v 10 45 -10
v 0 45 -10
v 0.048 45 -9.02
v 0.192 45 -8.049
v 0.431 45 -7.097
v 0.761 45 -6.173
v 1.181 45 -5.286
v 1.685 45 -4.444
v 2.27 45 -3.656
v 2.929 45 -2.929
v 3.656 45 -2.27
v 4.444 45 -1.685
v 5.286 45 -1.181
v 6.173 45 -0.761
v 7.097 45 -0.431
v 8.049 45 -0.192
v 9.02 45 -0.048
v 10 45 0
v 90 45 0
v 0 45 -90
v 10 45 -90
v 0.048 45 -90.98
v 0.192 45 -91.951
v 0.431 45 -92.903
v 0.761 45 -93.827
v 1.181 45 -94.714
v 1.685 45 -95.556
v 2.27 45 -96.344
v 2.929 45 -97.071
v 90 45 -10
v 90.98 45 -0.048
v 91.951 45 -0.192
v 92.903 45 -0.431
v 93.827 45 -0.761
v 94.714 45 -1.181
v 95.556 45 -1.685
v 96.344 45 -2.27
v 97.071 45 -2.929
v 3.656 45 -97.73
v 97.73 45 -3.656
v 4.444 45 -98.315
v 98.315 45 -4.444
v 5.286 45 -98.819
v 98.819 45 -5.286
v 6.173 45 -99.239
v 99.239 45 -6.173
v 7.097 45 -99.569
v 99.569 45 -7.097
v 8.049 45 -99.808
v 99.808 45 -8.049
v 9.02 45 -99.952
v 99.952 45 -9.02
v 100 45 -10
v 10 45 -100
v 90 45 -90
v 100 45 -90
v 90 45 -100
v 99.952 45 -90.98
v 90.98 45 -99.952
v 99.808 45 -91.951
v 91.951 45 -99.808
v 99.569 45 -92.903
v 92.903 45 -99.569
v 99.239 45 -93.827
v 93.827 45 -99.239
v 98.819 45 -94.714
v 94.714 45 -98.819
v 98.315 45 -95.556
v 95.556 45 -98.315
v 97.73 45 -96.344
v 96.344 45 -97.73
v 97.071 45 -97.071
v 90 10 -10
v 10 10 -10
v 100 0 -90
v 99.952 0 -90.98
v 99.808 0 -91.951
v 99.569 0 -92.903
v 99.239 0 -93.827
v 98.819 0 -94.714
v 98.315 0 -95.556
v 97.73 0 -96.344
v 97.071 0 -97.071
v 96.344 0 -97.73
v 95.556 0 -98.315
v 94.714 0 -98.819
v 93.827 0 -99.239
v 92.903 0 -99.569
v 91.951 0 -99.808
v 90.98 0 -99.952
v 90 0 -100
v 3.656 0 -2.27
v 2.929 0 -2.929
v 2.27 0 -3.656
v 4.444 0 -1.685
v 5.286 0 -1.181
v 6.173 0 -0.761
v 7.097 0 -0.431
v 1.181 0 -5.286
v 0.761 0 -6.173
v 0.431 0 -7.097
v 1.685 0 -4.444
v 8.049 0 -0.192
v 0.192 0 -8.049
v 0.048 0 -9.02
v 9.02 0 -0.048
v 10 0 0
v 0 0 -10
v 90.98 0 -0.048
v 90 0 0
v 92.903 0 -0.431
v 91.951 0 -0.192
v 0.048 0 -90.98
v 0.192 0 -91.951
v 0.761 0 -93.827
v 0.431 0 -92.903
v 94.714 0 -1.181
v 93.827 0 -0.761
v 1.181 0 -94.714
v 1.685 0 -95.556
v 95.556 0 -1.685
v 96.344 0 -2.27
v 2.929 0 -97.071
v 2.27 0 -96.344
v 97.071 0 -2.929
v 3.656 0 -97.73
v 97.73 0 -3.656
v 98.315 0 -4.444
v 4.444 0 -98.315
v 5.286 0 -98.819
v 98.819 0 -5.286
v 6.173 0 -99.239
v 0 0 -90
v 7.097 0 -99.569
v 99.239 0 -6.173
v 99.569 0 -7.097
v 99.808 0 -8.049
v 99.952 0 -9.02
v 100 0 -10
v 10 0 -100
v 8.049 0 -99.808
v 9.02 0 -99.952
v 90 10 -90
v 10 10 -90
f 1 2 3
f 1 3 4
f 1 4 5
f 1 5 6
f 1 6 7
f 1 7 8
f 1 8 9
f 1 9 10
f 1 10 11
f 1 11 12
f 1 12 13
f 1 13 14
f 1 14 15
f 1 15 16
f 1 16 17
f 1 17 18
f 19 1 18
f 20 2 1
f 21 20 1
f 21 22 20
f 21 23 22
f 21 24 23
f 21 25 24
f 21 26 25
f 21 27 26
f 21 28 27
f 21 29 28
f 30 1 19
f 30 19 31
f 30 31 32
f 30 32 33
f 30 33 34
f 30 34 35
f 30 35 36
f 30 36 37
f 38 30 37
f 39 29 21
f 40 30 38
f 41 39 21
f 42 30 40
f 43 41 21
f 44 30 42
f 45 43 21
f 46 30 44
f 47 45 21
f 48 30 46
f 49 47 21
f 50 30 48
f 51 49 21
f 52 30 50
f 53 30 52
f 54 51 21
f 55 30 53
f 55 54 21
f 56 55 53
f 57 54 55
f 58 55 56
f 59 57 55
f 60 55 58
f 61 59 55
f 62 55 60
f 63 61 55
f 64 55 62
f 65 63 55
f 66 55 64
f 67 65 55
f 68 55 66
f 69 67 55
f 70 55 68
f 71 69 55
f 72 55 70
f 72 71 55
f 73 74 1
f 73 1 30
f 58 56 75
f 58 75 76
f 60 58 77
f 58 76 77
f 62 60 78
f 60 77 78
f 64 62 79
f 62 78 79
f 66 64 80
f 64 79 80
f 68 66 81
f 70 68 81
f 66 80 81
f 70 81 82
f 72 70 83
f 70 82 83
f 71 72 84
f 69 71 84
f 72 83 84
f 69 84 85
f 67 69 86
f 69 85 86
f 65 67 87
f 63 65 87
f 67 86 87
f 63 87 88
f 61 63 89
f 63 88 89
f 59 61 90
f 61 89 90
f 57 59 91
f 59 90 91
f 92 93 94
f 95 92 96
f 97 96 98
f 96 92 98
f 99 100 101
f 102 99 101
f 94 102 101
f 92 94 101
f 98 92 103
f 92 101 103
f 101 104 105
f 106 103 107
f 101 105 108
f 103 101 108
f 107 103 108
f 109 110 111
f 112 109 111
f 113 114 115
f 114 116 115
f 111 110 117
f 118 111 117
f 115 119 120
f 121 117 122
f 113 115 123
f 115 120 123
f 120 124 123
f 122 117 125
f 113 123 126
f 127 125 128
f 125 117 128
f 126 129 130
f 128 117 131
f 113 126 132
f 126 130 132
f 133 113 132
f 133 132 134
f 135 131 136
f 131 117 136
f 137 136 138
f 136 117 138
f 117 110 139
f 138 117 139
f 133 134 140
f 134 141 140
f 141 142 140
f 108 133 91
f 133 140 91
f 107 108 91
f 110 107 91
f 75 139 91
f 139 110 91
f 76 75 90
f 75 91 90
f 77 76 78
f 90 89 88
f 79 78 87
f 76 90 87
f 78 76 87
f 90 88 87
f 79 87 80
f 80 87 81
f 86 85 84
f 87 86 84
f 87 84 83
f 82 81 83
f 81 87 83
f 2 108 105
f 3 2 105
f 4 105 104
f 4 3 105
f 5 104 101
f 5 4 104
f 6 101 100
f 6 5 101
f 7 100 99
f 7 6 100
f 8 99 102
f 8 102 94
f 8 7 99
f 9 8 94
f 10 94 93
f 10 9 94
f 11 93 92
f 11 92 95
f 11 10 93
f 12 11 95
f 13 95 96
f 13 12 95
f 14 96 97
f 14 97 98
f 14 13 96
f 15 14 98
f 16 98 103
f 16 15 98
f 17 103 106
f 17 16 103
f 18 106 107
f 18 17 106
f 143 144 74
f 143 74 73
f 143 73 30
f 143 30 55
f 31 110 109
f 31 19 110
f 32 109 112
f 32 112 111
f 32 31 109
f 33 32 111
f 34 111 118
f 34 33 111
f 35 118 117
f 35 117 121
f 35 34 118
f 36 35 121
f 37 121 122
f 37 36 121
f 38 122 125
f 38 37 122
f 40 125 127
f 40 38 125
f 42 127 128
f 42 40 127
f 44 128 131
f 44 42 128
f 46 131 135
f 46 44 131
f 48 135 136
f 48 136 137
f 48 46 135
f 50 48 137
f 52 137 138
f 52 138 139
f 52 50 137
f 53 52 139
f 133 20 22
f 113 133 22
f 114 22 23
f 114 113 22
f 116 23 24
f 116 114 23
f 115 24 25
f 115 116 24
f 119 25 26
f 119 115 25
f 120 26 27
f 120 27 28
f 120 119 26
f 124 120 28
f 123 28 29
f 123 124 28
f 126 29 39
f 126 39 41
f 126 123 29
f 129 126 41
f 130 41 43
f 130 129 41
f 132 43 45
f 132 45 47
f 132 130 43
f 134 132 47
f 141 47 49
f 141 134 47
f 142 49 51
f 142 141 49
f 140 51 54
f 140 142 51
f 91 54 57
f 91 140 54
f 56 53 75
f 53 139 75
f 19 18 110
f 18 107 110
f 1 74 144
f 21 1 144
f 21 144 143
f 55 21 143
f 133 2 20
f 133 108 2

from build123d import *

# Parameters (mm, degrees)
SKETCH3_W           = 100
SKETCH3_H           = 100
BOSS_EXTRUDE1_DEPTH = 10
SKETCH4_W           = 100
SKETCH4_H           = 100
SKETCH4_W_2         = 80
SKETCH4_H_2         = 80
BOSS_EXTRUDE2_DEPTH = 35
FILLET1_R           = 10


with BuildPart() as part:
    # Sketch3 → Boss-Extrude1 (new body)
    with BuildSketch(Plane(origin=(0, 0, 0), x_dir=(1, 0, 0), z_dir=(0, 1, 0))):
        with Locations((50, 50)):
            Rectangle(SKETCH3_W, SKETCH3_H)
    extrude(amount=BOSS_EXTRUDE1_DEPTH)

    # Sketch4 → Boss-Extrude2 (add)
    with BuildSketch(Plane(origin=(0, 10, 0), x_dir=(1, 0, 0), z_dir=(0, 1, 0))):
        with Locations((50, 50)):
            Rectangle(SKETCH4_W, SKETCH4_H)
        with Locations((50, 50)):
            Rectangle(SKETCH4_W_2, SKETCH4_H_2, mode=Mode.SUBTRACT)
    extrude(amount=BOSS_EXTRUDE2_DEPTH)

    # Fillet1
    fillet1_edges = [part.edges().sort_by_distance(p)[0] for p in [
        (0, 22.5, -100),
        (100, 22.5, -100),
        (100, 22.5, 0),
        (0, 22.5, 0),
    ]]
    fillet(fillet1_edges, radius=FILLET1_R)


solid = part.part
